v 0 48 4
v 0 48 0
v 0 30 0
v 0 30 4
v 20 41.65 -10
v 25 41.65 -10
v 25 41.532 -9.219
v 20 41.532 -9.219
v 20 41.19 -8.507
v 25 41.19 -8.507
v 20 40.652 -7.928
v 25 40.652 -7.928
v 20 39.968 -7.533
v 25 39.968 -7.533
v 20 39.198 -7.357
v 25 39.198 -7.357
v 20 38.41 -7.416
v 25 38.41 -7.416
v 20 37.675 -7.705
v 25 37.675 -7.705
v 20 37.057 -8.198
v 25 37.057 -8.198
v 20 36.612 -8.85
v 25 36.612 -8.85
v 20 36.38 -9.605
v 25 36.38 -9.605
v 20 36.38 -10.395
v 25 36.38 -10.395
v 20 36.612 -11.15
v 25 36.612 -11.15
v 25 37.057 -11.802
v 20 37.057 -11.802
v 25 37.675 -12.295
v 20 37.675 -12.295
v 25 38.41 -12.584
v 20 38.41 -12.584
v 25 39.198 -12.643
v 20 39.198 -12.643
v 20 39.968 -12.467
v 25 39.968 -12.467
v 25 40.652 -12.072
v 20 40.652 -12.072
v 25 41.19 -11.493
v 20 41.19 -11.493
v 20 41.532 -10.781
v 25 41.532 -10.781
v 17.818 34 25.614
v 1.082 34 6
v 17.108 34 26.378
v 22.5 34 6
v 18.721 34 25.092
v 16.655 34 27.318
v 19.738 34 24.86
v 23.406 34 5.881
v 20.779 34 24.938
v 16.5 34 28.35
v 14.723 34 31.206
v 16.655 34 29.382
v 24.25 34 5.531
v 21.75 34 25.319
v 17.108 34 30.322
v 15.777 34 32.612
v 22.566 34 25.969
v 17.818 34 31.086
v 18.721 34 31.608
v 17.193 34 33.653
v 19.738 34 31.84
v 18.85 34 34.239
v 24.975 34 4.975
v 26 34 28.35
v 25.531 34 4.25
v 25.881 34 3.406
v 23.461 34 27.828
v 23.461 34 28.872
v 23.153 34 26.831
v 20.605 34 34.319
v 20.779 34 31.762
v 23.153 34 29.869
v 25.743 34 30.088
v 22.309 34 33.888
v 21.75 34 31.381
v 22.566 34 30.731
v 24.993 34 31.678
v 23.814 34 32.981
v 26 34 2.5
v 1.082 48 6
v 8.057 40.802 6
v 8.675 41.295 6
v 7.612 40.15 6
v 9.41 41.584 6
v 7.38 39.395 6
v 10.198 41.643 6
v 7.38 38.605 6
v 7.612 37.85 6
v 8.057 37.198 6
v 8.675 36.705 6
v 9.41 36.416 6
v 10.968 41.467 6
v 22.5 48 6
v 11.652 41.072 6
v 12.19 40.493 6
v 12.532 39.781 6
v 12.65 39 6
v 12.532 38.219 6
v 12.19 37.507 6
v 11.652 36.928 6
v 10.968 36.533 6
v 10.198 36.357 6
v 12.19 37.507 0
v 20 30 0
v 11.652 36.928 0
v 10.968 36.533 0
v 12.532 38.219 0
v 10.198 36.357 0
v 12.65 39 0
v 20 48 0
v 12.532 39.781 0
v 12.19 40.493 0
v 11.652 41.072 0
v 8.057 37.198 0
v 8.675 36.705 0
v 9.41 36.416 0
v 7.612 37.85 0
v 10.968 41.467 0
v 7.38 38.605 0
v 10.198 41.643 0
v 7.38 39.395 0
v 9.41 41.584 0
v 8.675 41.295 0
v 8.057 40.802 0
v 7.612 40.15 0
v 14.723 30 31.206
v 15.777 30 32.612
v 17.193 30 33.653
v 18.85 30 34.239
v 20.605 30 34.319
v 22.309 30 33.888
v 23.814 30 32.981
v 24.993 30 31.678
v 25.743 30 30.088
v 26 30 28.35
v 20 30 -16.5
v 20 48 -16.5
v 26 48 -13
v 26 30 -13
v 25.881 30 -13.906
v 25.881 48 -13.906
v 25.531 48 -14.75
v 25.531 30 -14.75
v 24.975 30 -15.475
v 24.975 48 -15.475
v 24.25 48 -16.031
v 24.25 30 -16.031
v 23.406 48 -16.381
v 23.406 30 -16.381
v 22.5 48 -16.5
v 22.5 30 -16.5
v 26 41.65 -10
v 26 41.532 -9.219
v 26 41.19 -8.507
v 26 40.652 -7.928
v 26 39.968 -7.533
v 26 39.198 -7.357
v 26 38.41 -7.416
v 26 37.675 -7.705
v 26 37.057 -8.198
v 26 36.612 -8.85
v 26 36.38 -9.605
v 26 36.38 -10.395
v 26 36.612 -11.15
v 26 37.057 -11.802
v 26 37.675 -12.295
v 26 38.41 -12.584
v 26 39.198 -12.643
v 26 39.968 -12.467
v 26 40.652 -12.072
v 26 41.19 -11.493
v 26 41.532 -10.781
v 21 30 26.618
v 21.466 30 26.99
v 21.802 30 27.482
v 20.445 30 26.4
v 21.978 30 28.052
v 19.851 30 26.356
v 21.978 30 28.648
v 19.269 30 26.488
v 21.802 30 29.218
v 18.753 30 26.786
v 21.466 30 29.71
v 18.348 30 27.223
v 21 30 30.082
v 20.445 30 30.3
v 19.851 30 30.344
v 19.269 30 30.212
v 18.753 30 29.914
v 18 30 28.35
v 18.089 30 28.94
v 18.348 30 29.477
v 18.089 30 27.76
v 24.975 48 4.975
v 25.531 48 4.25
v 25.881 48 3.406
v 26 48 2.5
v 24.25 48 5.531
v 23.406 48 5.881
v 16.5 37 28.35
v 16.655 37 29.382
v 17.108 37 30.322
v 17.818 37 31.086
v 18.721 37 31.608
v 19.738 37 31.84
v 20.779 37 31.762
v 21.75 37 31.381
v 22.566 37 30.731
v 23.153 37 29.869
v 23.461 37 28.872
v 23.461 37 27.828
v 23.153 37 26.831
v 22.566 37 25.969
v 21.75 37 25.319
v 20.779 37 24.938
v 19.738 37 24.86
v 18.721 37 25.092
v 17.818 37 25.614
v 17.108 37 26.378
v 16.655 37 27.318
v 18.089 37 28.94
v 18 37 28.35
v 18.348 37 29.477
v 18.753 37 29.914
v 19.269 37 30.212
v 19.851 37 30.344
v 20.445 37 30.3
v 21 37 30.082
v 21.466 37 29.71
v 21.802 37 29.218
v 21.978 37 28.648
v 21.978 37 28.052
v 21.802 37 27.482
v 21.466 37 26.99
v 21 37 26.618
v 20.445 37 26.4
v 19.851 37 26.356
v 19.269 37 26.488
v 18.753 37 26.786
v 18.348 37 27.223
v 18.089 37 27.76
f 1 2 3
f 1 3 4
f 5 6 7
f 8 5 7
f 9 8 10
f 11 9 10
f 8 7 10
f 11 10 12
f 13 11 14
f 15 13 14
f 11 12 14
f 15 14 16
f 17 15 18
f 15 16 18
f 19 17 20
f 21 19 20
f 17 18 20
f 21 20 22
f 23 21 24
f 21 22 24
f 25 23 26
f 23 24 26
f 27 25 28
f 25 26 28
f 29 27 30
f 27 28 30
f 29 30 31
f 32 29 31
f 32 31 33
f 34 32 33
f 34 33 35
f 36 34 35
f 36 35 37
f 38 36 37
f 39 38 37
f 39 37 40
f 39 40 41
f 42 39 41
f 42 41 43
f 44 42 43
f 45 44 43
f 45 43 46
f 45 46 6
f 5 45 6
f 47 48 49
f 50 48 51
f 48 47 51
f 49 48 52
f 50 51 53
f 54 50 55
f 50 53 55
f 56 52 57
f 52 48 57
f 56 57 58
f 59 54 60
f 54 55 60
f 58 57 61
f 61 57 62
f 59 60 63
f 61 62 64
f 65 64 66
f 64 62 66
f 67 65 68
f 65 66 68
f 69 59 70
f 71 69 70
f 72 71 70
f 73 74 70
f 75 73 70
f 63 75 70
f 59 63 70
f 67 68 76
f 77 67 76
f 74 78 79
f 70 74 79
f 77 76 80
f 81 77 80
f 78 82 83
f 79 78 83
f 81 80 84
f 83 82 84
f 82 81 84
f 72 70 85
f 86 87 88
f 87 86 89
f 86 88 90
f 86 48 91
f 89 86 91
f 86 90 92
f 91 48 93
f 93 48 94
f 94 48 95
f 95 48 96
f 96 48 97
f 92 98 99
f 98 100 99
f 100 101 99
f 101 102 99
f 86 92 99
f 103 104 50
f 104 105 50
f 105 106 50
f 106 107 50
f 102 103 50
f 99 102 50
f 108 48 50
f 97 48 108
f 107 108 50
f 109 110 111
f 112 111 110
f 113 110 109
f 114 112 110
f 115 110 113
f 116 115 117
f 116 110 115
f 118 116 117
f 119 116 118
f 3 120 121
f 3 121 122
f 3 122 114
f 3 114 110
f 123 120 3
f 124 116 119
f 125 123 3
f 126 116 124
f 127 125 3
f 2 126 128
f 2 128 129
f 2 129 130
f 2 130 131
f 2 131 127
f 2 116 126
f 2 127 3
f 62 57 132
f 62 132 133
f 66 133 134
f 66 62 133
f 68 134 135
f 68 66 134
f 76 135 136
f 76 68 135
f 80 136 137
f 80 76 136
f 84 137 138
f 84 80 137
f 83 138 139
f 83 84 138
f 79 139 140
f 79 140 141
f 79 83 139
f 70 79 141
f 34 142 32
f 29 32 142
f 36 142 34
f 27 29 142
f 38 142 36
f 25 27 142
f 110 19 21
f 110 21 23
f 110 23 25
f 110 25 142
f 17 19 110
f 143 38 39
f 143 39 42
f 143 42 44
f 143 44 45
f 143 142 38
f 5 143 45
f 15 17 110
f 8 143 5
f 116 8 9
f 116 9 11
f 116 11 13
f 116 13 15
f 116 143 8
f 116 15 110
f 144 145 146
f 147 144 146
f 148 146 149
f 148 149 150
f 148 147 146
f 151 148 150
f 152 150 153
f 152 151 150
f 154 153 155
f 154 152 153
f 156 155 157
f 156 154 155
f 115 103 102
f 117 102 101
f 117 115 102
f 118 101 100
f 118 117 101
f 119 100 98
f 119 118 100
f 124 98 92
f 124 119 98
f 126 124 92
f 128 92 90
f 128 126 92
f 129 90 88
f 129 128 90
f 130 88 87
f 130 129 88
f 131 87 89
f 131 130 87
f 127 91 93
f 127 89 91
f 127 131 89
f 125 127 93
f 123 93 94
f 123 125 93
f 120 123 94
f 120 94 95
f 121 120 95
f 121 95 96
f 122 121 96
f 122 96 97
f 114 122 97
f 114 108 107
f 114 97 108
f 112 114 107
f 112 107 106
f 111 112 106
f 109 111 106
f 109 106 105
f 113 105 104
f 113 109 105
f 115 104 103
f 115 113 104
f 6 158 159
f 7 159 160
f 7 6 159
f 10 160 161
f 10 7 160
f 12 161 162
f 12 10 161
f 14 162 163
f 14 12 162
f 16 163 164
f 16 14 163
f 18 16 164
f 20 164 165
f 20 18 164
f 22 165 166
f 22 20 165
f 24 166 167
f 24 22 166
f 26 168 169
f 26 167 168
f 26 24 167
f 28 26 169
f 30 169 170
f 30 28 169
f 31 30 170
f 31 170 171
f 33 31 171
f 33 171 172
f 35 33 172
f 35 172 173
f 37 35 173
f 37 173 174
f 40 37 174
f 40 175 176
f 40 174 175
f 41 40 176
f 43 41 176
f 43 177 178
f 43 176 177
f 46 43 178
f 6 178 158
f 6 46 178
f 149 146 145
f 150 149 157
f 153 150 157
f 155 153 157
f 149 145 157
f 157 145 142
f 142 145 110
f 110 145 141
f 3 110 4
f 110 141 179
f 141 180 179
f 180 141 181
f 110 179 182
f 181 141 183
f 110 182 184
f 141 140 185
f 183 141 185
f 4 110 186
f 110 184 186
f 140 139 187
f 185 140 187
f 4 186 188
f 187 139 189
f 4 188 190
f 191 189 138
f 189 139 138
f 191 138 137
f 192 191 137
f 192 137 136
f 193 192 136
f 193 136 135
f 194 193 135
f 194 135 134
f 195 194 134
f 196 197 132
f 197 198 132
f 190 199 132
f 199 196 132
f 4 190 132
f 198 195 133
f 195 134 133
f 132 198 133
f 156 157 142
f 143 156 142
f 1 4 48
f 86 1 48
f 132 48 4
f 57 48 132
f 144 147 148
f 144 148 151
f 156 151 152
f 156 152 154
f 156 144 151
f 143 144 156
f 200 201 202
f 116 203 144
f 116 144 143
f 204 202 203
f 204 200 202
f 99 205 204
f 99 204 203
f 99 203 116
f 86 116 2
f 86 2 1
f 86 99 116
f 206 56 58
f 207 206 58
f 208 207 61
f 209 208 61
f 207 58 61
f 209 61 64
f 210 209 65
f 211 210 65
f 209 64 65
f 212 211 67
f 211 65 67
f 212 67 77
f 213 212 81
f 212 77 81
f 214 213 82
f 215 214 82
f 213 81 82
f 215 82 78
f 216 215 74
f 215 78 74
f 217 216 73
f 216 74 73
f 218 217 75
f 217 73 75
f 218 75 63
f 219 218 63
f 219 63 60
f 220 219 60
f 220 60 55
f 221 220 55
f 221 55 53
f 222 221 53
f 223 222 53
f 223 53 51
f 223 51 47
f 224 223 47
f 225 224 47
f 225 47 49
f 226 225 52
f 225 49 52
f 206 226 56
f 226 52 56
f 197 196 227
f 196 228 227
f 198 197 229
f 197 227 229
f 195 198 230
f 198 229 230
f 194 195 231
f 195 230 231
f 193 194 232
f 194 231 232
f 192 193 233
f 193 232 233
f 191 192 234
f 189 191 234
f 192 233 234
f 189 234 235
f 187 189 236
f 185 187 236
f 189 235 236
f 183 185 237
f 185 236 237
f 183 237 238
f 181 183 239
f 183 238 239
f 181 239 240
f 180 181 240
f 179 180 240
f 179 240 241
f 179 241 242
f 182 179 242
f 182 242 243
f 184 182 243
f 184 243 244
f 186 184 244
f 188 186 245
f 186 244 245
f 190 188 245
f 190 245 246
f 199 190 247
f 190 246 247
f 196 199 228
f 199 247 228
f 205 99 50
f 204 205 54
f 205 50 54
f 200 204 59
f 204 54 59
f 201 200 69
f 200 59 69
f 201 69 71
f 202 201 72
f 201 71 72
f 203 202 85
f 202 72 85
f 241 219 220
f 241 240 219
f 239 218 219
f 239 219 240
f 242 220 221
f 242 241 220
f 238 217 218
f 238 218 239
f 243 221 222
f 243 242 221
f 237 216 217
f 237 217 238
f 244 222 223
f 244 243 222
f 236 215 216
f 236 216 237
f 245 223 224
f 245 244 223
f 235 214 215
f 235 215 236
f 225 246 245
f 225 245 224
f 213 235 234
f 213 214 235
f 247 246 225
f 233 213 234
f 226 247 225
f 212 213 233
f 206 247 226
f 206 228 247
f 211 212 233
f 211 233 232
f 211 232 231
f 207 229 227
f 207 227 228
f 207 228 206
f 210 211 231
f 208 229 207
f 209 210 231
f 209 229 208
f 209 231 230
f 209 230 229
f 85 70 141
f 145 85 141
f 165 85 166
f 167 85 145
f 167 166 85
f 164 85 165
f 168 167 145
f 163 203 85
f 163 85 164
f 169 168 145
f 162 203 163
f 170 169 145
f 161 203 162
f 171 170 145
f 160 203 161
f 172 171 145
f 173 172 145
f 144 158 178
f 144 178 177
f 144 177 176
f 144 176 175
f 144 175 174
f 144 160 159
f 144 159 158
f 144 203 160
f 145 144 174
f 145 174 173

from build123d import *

# Parameters (mm, degrees)
PAD013_DEPTH         = 9
POCKET017_DEPTH      = 14.001
SKETCH042_R          = 3.5
PAD014_DEPTH         = 3
SKETCH044_R          = 2
POCKET018_DEPTH      = 4.001
POCKET018_DEPTH_BACK = 14.001
SKETCH045_R          = 2.65
POCKET019_DEPTH      = 34.351
POCKET019_DEPTH_BACK = 16.501
SKETCH046_R          = 2.65
POCKET020_DEPTH      = 25.001
POCKET020_DEPTH_BACK = 1.001


with BuildPart() as part:
    # Sketch041 → Pad013 (new body, symmetric)
    with BuildSketch(Plane(origin=(0, 0, 0), x_dir=(-1, 0, 0), z_dir=(0, 1, 0))):
        with BuildLine():
            Line((-26, 28.35), (-26, -13))
            ThreePointArc((-26, -13), (-24.974874, -15.474874), (-22.5, -16.5))
            Line((-22.5, -16.5), (-20, -16.5))
            Line((-20, -16.5), (-20, 0))
            Line((-20, 0), (0, 0))
            Line((0, 0), (0, 4))
            Line((0, 4), (-14.723172, 31.205711))
            ThreePointArc((-14.723172, 31.205711), (-21.472928, 34.166398), (-26, 28.35))
        make_face()
    extrude(amount=PAD013_DEPTH, both=True)

    # Sketch043 → Pocket017 (cut, through all)
    with BuildSketch(Plane(origin=(0, -5, 0), x_dir=(-1, 0, 0), z_dir=(0, 1, 0))):
        with BuildLine():
            Line((-26, 2.5), (-26, 40))
            Line((-26, 40), (0, 40))
            Line((0, 40), (0, 6))
            Line((0, 6), (-22.5, 6))
            ThreePointArc((-22.5, 6), (-24.974874, 4.974874), (-26, 2.5))
        make_face()
    extrude(amount=POCKET017_DEPTH, mode=Mode.SUBTRACT)

    # Sketch042 → Pad014 (join)
    with BuildSketch(Plane(origin=(0, -5, 0), x_dir=(-1, 0, 0), z_dir=(0, 1, 0))):
        with Locations((-20, 28.35)):
            Circle(SKETCH042_R)
    extrude(amount=PAD014_DEPTH)

    # Sketch044 → Pocket018 (cut, two sides)
    with BuildSketch(Plane(origin=(0, -5, 0), x_dir=(-1, 0, 0), z_dir=(0, 1, 0))) as pocket018_sk:
        with Locations((-20, 28.35)):
            Circle(SKETCH044_R)
    extrude(amount=-POCKET018_DEPTH, mode=Mode.SUBTRACT)
    extrude(pocket018_sk.sketch, amount=POCKET018_DEPTH_BACK, mode=Mode.SUBTRACT)

    # Sketch045 → Pocket019 (cut, two sides)
    with BuildSketch(Plane(origin=(10, 0, 0), x_dir=(1, 0, 0), z_dir=(0, 0, 1))) as pocket019_sk:
        Circle(SKETCH045_R)
    extrude(amount=POCKET019_DEPTH, mode=Mode.SUBTRACT)
    extrude(pocket019_sk.sketch, amount=-POCKET019_DEPTH_BACK, mode=Mode.SUBTRACT)

    # Sketch046 → Pocket020 (cut, two sides)
    with BuildSketch(Plane(origin=(25, 0, -10), x_dir=(0, 1, 0), z_dir=(1, 0, 0))) as pocket020_sk:
        Circle(SKETCH046_R)
    extrude(amount=-POCKET020_DEPTH, mode=Mode.SUBTRACT)
    extrude(pocket020_sk.sketch, amount=POCKET020_DEPTH_BACK, mode=Mode.SUBTRACT)


with BuildPart() as part_1:
    # Body018 placement: moved
    add(part.part.moved(Location((0, 39, 0))))


solid = part_1.part
